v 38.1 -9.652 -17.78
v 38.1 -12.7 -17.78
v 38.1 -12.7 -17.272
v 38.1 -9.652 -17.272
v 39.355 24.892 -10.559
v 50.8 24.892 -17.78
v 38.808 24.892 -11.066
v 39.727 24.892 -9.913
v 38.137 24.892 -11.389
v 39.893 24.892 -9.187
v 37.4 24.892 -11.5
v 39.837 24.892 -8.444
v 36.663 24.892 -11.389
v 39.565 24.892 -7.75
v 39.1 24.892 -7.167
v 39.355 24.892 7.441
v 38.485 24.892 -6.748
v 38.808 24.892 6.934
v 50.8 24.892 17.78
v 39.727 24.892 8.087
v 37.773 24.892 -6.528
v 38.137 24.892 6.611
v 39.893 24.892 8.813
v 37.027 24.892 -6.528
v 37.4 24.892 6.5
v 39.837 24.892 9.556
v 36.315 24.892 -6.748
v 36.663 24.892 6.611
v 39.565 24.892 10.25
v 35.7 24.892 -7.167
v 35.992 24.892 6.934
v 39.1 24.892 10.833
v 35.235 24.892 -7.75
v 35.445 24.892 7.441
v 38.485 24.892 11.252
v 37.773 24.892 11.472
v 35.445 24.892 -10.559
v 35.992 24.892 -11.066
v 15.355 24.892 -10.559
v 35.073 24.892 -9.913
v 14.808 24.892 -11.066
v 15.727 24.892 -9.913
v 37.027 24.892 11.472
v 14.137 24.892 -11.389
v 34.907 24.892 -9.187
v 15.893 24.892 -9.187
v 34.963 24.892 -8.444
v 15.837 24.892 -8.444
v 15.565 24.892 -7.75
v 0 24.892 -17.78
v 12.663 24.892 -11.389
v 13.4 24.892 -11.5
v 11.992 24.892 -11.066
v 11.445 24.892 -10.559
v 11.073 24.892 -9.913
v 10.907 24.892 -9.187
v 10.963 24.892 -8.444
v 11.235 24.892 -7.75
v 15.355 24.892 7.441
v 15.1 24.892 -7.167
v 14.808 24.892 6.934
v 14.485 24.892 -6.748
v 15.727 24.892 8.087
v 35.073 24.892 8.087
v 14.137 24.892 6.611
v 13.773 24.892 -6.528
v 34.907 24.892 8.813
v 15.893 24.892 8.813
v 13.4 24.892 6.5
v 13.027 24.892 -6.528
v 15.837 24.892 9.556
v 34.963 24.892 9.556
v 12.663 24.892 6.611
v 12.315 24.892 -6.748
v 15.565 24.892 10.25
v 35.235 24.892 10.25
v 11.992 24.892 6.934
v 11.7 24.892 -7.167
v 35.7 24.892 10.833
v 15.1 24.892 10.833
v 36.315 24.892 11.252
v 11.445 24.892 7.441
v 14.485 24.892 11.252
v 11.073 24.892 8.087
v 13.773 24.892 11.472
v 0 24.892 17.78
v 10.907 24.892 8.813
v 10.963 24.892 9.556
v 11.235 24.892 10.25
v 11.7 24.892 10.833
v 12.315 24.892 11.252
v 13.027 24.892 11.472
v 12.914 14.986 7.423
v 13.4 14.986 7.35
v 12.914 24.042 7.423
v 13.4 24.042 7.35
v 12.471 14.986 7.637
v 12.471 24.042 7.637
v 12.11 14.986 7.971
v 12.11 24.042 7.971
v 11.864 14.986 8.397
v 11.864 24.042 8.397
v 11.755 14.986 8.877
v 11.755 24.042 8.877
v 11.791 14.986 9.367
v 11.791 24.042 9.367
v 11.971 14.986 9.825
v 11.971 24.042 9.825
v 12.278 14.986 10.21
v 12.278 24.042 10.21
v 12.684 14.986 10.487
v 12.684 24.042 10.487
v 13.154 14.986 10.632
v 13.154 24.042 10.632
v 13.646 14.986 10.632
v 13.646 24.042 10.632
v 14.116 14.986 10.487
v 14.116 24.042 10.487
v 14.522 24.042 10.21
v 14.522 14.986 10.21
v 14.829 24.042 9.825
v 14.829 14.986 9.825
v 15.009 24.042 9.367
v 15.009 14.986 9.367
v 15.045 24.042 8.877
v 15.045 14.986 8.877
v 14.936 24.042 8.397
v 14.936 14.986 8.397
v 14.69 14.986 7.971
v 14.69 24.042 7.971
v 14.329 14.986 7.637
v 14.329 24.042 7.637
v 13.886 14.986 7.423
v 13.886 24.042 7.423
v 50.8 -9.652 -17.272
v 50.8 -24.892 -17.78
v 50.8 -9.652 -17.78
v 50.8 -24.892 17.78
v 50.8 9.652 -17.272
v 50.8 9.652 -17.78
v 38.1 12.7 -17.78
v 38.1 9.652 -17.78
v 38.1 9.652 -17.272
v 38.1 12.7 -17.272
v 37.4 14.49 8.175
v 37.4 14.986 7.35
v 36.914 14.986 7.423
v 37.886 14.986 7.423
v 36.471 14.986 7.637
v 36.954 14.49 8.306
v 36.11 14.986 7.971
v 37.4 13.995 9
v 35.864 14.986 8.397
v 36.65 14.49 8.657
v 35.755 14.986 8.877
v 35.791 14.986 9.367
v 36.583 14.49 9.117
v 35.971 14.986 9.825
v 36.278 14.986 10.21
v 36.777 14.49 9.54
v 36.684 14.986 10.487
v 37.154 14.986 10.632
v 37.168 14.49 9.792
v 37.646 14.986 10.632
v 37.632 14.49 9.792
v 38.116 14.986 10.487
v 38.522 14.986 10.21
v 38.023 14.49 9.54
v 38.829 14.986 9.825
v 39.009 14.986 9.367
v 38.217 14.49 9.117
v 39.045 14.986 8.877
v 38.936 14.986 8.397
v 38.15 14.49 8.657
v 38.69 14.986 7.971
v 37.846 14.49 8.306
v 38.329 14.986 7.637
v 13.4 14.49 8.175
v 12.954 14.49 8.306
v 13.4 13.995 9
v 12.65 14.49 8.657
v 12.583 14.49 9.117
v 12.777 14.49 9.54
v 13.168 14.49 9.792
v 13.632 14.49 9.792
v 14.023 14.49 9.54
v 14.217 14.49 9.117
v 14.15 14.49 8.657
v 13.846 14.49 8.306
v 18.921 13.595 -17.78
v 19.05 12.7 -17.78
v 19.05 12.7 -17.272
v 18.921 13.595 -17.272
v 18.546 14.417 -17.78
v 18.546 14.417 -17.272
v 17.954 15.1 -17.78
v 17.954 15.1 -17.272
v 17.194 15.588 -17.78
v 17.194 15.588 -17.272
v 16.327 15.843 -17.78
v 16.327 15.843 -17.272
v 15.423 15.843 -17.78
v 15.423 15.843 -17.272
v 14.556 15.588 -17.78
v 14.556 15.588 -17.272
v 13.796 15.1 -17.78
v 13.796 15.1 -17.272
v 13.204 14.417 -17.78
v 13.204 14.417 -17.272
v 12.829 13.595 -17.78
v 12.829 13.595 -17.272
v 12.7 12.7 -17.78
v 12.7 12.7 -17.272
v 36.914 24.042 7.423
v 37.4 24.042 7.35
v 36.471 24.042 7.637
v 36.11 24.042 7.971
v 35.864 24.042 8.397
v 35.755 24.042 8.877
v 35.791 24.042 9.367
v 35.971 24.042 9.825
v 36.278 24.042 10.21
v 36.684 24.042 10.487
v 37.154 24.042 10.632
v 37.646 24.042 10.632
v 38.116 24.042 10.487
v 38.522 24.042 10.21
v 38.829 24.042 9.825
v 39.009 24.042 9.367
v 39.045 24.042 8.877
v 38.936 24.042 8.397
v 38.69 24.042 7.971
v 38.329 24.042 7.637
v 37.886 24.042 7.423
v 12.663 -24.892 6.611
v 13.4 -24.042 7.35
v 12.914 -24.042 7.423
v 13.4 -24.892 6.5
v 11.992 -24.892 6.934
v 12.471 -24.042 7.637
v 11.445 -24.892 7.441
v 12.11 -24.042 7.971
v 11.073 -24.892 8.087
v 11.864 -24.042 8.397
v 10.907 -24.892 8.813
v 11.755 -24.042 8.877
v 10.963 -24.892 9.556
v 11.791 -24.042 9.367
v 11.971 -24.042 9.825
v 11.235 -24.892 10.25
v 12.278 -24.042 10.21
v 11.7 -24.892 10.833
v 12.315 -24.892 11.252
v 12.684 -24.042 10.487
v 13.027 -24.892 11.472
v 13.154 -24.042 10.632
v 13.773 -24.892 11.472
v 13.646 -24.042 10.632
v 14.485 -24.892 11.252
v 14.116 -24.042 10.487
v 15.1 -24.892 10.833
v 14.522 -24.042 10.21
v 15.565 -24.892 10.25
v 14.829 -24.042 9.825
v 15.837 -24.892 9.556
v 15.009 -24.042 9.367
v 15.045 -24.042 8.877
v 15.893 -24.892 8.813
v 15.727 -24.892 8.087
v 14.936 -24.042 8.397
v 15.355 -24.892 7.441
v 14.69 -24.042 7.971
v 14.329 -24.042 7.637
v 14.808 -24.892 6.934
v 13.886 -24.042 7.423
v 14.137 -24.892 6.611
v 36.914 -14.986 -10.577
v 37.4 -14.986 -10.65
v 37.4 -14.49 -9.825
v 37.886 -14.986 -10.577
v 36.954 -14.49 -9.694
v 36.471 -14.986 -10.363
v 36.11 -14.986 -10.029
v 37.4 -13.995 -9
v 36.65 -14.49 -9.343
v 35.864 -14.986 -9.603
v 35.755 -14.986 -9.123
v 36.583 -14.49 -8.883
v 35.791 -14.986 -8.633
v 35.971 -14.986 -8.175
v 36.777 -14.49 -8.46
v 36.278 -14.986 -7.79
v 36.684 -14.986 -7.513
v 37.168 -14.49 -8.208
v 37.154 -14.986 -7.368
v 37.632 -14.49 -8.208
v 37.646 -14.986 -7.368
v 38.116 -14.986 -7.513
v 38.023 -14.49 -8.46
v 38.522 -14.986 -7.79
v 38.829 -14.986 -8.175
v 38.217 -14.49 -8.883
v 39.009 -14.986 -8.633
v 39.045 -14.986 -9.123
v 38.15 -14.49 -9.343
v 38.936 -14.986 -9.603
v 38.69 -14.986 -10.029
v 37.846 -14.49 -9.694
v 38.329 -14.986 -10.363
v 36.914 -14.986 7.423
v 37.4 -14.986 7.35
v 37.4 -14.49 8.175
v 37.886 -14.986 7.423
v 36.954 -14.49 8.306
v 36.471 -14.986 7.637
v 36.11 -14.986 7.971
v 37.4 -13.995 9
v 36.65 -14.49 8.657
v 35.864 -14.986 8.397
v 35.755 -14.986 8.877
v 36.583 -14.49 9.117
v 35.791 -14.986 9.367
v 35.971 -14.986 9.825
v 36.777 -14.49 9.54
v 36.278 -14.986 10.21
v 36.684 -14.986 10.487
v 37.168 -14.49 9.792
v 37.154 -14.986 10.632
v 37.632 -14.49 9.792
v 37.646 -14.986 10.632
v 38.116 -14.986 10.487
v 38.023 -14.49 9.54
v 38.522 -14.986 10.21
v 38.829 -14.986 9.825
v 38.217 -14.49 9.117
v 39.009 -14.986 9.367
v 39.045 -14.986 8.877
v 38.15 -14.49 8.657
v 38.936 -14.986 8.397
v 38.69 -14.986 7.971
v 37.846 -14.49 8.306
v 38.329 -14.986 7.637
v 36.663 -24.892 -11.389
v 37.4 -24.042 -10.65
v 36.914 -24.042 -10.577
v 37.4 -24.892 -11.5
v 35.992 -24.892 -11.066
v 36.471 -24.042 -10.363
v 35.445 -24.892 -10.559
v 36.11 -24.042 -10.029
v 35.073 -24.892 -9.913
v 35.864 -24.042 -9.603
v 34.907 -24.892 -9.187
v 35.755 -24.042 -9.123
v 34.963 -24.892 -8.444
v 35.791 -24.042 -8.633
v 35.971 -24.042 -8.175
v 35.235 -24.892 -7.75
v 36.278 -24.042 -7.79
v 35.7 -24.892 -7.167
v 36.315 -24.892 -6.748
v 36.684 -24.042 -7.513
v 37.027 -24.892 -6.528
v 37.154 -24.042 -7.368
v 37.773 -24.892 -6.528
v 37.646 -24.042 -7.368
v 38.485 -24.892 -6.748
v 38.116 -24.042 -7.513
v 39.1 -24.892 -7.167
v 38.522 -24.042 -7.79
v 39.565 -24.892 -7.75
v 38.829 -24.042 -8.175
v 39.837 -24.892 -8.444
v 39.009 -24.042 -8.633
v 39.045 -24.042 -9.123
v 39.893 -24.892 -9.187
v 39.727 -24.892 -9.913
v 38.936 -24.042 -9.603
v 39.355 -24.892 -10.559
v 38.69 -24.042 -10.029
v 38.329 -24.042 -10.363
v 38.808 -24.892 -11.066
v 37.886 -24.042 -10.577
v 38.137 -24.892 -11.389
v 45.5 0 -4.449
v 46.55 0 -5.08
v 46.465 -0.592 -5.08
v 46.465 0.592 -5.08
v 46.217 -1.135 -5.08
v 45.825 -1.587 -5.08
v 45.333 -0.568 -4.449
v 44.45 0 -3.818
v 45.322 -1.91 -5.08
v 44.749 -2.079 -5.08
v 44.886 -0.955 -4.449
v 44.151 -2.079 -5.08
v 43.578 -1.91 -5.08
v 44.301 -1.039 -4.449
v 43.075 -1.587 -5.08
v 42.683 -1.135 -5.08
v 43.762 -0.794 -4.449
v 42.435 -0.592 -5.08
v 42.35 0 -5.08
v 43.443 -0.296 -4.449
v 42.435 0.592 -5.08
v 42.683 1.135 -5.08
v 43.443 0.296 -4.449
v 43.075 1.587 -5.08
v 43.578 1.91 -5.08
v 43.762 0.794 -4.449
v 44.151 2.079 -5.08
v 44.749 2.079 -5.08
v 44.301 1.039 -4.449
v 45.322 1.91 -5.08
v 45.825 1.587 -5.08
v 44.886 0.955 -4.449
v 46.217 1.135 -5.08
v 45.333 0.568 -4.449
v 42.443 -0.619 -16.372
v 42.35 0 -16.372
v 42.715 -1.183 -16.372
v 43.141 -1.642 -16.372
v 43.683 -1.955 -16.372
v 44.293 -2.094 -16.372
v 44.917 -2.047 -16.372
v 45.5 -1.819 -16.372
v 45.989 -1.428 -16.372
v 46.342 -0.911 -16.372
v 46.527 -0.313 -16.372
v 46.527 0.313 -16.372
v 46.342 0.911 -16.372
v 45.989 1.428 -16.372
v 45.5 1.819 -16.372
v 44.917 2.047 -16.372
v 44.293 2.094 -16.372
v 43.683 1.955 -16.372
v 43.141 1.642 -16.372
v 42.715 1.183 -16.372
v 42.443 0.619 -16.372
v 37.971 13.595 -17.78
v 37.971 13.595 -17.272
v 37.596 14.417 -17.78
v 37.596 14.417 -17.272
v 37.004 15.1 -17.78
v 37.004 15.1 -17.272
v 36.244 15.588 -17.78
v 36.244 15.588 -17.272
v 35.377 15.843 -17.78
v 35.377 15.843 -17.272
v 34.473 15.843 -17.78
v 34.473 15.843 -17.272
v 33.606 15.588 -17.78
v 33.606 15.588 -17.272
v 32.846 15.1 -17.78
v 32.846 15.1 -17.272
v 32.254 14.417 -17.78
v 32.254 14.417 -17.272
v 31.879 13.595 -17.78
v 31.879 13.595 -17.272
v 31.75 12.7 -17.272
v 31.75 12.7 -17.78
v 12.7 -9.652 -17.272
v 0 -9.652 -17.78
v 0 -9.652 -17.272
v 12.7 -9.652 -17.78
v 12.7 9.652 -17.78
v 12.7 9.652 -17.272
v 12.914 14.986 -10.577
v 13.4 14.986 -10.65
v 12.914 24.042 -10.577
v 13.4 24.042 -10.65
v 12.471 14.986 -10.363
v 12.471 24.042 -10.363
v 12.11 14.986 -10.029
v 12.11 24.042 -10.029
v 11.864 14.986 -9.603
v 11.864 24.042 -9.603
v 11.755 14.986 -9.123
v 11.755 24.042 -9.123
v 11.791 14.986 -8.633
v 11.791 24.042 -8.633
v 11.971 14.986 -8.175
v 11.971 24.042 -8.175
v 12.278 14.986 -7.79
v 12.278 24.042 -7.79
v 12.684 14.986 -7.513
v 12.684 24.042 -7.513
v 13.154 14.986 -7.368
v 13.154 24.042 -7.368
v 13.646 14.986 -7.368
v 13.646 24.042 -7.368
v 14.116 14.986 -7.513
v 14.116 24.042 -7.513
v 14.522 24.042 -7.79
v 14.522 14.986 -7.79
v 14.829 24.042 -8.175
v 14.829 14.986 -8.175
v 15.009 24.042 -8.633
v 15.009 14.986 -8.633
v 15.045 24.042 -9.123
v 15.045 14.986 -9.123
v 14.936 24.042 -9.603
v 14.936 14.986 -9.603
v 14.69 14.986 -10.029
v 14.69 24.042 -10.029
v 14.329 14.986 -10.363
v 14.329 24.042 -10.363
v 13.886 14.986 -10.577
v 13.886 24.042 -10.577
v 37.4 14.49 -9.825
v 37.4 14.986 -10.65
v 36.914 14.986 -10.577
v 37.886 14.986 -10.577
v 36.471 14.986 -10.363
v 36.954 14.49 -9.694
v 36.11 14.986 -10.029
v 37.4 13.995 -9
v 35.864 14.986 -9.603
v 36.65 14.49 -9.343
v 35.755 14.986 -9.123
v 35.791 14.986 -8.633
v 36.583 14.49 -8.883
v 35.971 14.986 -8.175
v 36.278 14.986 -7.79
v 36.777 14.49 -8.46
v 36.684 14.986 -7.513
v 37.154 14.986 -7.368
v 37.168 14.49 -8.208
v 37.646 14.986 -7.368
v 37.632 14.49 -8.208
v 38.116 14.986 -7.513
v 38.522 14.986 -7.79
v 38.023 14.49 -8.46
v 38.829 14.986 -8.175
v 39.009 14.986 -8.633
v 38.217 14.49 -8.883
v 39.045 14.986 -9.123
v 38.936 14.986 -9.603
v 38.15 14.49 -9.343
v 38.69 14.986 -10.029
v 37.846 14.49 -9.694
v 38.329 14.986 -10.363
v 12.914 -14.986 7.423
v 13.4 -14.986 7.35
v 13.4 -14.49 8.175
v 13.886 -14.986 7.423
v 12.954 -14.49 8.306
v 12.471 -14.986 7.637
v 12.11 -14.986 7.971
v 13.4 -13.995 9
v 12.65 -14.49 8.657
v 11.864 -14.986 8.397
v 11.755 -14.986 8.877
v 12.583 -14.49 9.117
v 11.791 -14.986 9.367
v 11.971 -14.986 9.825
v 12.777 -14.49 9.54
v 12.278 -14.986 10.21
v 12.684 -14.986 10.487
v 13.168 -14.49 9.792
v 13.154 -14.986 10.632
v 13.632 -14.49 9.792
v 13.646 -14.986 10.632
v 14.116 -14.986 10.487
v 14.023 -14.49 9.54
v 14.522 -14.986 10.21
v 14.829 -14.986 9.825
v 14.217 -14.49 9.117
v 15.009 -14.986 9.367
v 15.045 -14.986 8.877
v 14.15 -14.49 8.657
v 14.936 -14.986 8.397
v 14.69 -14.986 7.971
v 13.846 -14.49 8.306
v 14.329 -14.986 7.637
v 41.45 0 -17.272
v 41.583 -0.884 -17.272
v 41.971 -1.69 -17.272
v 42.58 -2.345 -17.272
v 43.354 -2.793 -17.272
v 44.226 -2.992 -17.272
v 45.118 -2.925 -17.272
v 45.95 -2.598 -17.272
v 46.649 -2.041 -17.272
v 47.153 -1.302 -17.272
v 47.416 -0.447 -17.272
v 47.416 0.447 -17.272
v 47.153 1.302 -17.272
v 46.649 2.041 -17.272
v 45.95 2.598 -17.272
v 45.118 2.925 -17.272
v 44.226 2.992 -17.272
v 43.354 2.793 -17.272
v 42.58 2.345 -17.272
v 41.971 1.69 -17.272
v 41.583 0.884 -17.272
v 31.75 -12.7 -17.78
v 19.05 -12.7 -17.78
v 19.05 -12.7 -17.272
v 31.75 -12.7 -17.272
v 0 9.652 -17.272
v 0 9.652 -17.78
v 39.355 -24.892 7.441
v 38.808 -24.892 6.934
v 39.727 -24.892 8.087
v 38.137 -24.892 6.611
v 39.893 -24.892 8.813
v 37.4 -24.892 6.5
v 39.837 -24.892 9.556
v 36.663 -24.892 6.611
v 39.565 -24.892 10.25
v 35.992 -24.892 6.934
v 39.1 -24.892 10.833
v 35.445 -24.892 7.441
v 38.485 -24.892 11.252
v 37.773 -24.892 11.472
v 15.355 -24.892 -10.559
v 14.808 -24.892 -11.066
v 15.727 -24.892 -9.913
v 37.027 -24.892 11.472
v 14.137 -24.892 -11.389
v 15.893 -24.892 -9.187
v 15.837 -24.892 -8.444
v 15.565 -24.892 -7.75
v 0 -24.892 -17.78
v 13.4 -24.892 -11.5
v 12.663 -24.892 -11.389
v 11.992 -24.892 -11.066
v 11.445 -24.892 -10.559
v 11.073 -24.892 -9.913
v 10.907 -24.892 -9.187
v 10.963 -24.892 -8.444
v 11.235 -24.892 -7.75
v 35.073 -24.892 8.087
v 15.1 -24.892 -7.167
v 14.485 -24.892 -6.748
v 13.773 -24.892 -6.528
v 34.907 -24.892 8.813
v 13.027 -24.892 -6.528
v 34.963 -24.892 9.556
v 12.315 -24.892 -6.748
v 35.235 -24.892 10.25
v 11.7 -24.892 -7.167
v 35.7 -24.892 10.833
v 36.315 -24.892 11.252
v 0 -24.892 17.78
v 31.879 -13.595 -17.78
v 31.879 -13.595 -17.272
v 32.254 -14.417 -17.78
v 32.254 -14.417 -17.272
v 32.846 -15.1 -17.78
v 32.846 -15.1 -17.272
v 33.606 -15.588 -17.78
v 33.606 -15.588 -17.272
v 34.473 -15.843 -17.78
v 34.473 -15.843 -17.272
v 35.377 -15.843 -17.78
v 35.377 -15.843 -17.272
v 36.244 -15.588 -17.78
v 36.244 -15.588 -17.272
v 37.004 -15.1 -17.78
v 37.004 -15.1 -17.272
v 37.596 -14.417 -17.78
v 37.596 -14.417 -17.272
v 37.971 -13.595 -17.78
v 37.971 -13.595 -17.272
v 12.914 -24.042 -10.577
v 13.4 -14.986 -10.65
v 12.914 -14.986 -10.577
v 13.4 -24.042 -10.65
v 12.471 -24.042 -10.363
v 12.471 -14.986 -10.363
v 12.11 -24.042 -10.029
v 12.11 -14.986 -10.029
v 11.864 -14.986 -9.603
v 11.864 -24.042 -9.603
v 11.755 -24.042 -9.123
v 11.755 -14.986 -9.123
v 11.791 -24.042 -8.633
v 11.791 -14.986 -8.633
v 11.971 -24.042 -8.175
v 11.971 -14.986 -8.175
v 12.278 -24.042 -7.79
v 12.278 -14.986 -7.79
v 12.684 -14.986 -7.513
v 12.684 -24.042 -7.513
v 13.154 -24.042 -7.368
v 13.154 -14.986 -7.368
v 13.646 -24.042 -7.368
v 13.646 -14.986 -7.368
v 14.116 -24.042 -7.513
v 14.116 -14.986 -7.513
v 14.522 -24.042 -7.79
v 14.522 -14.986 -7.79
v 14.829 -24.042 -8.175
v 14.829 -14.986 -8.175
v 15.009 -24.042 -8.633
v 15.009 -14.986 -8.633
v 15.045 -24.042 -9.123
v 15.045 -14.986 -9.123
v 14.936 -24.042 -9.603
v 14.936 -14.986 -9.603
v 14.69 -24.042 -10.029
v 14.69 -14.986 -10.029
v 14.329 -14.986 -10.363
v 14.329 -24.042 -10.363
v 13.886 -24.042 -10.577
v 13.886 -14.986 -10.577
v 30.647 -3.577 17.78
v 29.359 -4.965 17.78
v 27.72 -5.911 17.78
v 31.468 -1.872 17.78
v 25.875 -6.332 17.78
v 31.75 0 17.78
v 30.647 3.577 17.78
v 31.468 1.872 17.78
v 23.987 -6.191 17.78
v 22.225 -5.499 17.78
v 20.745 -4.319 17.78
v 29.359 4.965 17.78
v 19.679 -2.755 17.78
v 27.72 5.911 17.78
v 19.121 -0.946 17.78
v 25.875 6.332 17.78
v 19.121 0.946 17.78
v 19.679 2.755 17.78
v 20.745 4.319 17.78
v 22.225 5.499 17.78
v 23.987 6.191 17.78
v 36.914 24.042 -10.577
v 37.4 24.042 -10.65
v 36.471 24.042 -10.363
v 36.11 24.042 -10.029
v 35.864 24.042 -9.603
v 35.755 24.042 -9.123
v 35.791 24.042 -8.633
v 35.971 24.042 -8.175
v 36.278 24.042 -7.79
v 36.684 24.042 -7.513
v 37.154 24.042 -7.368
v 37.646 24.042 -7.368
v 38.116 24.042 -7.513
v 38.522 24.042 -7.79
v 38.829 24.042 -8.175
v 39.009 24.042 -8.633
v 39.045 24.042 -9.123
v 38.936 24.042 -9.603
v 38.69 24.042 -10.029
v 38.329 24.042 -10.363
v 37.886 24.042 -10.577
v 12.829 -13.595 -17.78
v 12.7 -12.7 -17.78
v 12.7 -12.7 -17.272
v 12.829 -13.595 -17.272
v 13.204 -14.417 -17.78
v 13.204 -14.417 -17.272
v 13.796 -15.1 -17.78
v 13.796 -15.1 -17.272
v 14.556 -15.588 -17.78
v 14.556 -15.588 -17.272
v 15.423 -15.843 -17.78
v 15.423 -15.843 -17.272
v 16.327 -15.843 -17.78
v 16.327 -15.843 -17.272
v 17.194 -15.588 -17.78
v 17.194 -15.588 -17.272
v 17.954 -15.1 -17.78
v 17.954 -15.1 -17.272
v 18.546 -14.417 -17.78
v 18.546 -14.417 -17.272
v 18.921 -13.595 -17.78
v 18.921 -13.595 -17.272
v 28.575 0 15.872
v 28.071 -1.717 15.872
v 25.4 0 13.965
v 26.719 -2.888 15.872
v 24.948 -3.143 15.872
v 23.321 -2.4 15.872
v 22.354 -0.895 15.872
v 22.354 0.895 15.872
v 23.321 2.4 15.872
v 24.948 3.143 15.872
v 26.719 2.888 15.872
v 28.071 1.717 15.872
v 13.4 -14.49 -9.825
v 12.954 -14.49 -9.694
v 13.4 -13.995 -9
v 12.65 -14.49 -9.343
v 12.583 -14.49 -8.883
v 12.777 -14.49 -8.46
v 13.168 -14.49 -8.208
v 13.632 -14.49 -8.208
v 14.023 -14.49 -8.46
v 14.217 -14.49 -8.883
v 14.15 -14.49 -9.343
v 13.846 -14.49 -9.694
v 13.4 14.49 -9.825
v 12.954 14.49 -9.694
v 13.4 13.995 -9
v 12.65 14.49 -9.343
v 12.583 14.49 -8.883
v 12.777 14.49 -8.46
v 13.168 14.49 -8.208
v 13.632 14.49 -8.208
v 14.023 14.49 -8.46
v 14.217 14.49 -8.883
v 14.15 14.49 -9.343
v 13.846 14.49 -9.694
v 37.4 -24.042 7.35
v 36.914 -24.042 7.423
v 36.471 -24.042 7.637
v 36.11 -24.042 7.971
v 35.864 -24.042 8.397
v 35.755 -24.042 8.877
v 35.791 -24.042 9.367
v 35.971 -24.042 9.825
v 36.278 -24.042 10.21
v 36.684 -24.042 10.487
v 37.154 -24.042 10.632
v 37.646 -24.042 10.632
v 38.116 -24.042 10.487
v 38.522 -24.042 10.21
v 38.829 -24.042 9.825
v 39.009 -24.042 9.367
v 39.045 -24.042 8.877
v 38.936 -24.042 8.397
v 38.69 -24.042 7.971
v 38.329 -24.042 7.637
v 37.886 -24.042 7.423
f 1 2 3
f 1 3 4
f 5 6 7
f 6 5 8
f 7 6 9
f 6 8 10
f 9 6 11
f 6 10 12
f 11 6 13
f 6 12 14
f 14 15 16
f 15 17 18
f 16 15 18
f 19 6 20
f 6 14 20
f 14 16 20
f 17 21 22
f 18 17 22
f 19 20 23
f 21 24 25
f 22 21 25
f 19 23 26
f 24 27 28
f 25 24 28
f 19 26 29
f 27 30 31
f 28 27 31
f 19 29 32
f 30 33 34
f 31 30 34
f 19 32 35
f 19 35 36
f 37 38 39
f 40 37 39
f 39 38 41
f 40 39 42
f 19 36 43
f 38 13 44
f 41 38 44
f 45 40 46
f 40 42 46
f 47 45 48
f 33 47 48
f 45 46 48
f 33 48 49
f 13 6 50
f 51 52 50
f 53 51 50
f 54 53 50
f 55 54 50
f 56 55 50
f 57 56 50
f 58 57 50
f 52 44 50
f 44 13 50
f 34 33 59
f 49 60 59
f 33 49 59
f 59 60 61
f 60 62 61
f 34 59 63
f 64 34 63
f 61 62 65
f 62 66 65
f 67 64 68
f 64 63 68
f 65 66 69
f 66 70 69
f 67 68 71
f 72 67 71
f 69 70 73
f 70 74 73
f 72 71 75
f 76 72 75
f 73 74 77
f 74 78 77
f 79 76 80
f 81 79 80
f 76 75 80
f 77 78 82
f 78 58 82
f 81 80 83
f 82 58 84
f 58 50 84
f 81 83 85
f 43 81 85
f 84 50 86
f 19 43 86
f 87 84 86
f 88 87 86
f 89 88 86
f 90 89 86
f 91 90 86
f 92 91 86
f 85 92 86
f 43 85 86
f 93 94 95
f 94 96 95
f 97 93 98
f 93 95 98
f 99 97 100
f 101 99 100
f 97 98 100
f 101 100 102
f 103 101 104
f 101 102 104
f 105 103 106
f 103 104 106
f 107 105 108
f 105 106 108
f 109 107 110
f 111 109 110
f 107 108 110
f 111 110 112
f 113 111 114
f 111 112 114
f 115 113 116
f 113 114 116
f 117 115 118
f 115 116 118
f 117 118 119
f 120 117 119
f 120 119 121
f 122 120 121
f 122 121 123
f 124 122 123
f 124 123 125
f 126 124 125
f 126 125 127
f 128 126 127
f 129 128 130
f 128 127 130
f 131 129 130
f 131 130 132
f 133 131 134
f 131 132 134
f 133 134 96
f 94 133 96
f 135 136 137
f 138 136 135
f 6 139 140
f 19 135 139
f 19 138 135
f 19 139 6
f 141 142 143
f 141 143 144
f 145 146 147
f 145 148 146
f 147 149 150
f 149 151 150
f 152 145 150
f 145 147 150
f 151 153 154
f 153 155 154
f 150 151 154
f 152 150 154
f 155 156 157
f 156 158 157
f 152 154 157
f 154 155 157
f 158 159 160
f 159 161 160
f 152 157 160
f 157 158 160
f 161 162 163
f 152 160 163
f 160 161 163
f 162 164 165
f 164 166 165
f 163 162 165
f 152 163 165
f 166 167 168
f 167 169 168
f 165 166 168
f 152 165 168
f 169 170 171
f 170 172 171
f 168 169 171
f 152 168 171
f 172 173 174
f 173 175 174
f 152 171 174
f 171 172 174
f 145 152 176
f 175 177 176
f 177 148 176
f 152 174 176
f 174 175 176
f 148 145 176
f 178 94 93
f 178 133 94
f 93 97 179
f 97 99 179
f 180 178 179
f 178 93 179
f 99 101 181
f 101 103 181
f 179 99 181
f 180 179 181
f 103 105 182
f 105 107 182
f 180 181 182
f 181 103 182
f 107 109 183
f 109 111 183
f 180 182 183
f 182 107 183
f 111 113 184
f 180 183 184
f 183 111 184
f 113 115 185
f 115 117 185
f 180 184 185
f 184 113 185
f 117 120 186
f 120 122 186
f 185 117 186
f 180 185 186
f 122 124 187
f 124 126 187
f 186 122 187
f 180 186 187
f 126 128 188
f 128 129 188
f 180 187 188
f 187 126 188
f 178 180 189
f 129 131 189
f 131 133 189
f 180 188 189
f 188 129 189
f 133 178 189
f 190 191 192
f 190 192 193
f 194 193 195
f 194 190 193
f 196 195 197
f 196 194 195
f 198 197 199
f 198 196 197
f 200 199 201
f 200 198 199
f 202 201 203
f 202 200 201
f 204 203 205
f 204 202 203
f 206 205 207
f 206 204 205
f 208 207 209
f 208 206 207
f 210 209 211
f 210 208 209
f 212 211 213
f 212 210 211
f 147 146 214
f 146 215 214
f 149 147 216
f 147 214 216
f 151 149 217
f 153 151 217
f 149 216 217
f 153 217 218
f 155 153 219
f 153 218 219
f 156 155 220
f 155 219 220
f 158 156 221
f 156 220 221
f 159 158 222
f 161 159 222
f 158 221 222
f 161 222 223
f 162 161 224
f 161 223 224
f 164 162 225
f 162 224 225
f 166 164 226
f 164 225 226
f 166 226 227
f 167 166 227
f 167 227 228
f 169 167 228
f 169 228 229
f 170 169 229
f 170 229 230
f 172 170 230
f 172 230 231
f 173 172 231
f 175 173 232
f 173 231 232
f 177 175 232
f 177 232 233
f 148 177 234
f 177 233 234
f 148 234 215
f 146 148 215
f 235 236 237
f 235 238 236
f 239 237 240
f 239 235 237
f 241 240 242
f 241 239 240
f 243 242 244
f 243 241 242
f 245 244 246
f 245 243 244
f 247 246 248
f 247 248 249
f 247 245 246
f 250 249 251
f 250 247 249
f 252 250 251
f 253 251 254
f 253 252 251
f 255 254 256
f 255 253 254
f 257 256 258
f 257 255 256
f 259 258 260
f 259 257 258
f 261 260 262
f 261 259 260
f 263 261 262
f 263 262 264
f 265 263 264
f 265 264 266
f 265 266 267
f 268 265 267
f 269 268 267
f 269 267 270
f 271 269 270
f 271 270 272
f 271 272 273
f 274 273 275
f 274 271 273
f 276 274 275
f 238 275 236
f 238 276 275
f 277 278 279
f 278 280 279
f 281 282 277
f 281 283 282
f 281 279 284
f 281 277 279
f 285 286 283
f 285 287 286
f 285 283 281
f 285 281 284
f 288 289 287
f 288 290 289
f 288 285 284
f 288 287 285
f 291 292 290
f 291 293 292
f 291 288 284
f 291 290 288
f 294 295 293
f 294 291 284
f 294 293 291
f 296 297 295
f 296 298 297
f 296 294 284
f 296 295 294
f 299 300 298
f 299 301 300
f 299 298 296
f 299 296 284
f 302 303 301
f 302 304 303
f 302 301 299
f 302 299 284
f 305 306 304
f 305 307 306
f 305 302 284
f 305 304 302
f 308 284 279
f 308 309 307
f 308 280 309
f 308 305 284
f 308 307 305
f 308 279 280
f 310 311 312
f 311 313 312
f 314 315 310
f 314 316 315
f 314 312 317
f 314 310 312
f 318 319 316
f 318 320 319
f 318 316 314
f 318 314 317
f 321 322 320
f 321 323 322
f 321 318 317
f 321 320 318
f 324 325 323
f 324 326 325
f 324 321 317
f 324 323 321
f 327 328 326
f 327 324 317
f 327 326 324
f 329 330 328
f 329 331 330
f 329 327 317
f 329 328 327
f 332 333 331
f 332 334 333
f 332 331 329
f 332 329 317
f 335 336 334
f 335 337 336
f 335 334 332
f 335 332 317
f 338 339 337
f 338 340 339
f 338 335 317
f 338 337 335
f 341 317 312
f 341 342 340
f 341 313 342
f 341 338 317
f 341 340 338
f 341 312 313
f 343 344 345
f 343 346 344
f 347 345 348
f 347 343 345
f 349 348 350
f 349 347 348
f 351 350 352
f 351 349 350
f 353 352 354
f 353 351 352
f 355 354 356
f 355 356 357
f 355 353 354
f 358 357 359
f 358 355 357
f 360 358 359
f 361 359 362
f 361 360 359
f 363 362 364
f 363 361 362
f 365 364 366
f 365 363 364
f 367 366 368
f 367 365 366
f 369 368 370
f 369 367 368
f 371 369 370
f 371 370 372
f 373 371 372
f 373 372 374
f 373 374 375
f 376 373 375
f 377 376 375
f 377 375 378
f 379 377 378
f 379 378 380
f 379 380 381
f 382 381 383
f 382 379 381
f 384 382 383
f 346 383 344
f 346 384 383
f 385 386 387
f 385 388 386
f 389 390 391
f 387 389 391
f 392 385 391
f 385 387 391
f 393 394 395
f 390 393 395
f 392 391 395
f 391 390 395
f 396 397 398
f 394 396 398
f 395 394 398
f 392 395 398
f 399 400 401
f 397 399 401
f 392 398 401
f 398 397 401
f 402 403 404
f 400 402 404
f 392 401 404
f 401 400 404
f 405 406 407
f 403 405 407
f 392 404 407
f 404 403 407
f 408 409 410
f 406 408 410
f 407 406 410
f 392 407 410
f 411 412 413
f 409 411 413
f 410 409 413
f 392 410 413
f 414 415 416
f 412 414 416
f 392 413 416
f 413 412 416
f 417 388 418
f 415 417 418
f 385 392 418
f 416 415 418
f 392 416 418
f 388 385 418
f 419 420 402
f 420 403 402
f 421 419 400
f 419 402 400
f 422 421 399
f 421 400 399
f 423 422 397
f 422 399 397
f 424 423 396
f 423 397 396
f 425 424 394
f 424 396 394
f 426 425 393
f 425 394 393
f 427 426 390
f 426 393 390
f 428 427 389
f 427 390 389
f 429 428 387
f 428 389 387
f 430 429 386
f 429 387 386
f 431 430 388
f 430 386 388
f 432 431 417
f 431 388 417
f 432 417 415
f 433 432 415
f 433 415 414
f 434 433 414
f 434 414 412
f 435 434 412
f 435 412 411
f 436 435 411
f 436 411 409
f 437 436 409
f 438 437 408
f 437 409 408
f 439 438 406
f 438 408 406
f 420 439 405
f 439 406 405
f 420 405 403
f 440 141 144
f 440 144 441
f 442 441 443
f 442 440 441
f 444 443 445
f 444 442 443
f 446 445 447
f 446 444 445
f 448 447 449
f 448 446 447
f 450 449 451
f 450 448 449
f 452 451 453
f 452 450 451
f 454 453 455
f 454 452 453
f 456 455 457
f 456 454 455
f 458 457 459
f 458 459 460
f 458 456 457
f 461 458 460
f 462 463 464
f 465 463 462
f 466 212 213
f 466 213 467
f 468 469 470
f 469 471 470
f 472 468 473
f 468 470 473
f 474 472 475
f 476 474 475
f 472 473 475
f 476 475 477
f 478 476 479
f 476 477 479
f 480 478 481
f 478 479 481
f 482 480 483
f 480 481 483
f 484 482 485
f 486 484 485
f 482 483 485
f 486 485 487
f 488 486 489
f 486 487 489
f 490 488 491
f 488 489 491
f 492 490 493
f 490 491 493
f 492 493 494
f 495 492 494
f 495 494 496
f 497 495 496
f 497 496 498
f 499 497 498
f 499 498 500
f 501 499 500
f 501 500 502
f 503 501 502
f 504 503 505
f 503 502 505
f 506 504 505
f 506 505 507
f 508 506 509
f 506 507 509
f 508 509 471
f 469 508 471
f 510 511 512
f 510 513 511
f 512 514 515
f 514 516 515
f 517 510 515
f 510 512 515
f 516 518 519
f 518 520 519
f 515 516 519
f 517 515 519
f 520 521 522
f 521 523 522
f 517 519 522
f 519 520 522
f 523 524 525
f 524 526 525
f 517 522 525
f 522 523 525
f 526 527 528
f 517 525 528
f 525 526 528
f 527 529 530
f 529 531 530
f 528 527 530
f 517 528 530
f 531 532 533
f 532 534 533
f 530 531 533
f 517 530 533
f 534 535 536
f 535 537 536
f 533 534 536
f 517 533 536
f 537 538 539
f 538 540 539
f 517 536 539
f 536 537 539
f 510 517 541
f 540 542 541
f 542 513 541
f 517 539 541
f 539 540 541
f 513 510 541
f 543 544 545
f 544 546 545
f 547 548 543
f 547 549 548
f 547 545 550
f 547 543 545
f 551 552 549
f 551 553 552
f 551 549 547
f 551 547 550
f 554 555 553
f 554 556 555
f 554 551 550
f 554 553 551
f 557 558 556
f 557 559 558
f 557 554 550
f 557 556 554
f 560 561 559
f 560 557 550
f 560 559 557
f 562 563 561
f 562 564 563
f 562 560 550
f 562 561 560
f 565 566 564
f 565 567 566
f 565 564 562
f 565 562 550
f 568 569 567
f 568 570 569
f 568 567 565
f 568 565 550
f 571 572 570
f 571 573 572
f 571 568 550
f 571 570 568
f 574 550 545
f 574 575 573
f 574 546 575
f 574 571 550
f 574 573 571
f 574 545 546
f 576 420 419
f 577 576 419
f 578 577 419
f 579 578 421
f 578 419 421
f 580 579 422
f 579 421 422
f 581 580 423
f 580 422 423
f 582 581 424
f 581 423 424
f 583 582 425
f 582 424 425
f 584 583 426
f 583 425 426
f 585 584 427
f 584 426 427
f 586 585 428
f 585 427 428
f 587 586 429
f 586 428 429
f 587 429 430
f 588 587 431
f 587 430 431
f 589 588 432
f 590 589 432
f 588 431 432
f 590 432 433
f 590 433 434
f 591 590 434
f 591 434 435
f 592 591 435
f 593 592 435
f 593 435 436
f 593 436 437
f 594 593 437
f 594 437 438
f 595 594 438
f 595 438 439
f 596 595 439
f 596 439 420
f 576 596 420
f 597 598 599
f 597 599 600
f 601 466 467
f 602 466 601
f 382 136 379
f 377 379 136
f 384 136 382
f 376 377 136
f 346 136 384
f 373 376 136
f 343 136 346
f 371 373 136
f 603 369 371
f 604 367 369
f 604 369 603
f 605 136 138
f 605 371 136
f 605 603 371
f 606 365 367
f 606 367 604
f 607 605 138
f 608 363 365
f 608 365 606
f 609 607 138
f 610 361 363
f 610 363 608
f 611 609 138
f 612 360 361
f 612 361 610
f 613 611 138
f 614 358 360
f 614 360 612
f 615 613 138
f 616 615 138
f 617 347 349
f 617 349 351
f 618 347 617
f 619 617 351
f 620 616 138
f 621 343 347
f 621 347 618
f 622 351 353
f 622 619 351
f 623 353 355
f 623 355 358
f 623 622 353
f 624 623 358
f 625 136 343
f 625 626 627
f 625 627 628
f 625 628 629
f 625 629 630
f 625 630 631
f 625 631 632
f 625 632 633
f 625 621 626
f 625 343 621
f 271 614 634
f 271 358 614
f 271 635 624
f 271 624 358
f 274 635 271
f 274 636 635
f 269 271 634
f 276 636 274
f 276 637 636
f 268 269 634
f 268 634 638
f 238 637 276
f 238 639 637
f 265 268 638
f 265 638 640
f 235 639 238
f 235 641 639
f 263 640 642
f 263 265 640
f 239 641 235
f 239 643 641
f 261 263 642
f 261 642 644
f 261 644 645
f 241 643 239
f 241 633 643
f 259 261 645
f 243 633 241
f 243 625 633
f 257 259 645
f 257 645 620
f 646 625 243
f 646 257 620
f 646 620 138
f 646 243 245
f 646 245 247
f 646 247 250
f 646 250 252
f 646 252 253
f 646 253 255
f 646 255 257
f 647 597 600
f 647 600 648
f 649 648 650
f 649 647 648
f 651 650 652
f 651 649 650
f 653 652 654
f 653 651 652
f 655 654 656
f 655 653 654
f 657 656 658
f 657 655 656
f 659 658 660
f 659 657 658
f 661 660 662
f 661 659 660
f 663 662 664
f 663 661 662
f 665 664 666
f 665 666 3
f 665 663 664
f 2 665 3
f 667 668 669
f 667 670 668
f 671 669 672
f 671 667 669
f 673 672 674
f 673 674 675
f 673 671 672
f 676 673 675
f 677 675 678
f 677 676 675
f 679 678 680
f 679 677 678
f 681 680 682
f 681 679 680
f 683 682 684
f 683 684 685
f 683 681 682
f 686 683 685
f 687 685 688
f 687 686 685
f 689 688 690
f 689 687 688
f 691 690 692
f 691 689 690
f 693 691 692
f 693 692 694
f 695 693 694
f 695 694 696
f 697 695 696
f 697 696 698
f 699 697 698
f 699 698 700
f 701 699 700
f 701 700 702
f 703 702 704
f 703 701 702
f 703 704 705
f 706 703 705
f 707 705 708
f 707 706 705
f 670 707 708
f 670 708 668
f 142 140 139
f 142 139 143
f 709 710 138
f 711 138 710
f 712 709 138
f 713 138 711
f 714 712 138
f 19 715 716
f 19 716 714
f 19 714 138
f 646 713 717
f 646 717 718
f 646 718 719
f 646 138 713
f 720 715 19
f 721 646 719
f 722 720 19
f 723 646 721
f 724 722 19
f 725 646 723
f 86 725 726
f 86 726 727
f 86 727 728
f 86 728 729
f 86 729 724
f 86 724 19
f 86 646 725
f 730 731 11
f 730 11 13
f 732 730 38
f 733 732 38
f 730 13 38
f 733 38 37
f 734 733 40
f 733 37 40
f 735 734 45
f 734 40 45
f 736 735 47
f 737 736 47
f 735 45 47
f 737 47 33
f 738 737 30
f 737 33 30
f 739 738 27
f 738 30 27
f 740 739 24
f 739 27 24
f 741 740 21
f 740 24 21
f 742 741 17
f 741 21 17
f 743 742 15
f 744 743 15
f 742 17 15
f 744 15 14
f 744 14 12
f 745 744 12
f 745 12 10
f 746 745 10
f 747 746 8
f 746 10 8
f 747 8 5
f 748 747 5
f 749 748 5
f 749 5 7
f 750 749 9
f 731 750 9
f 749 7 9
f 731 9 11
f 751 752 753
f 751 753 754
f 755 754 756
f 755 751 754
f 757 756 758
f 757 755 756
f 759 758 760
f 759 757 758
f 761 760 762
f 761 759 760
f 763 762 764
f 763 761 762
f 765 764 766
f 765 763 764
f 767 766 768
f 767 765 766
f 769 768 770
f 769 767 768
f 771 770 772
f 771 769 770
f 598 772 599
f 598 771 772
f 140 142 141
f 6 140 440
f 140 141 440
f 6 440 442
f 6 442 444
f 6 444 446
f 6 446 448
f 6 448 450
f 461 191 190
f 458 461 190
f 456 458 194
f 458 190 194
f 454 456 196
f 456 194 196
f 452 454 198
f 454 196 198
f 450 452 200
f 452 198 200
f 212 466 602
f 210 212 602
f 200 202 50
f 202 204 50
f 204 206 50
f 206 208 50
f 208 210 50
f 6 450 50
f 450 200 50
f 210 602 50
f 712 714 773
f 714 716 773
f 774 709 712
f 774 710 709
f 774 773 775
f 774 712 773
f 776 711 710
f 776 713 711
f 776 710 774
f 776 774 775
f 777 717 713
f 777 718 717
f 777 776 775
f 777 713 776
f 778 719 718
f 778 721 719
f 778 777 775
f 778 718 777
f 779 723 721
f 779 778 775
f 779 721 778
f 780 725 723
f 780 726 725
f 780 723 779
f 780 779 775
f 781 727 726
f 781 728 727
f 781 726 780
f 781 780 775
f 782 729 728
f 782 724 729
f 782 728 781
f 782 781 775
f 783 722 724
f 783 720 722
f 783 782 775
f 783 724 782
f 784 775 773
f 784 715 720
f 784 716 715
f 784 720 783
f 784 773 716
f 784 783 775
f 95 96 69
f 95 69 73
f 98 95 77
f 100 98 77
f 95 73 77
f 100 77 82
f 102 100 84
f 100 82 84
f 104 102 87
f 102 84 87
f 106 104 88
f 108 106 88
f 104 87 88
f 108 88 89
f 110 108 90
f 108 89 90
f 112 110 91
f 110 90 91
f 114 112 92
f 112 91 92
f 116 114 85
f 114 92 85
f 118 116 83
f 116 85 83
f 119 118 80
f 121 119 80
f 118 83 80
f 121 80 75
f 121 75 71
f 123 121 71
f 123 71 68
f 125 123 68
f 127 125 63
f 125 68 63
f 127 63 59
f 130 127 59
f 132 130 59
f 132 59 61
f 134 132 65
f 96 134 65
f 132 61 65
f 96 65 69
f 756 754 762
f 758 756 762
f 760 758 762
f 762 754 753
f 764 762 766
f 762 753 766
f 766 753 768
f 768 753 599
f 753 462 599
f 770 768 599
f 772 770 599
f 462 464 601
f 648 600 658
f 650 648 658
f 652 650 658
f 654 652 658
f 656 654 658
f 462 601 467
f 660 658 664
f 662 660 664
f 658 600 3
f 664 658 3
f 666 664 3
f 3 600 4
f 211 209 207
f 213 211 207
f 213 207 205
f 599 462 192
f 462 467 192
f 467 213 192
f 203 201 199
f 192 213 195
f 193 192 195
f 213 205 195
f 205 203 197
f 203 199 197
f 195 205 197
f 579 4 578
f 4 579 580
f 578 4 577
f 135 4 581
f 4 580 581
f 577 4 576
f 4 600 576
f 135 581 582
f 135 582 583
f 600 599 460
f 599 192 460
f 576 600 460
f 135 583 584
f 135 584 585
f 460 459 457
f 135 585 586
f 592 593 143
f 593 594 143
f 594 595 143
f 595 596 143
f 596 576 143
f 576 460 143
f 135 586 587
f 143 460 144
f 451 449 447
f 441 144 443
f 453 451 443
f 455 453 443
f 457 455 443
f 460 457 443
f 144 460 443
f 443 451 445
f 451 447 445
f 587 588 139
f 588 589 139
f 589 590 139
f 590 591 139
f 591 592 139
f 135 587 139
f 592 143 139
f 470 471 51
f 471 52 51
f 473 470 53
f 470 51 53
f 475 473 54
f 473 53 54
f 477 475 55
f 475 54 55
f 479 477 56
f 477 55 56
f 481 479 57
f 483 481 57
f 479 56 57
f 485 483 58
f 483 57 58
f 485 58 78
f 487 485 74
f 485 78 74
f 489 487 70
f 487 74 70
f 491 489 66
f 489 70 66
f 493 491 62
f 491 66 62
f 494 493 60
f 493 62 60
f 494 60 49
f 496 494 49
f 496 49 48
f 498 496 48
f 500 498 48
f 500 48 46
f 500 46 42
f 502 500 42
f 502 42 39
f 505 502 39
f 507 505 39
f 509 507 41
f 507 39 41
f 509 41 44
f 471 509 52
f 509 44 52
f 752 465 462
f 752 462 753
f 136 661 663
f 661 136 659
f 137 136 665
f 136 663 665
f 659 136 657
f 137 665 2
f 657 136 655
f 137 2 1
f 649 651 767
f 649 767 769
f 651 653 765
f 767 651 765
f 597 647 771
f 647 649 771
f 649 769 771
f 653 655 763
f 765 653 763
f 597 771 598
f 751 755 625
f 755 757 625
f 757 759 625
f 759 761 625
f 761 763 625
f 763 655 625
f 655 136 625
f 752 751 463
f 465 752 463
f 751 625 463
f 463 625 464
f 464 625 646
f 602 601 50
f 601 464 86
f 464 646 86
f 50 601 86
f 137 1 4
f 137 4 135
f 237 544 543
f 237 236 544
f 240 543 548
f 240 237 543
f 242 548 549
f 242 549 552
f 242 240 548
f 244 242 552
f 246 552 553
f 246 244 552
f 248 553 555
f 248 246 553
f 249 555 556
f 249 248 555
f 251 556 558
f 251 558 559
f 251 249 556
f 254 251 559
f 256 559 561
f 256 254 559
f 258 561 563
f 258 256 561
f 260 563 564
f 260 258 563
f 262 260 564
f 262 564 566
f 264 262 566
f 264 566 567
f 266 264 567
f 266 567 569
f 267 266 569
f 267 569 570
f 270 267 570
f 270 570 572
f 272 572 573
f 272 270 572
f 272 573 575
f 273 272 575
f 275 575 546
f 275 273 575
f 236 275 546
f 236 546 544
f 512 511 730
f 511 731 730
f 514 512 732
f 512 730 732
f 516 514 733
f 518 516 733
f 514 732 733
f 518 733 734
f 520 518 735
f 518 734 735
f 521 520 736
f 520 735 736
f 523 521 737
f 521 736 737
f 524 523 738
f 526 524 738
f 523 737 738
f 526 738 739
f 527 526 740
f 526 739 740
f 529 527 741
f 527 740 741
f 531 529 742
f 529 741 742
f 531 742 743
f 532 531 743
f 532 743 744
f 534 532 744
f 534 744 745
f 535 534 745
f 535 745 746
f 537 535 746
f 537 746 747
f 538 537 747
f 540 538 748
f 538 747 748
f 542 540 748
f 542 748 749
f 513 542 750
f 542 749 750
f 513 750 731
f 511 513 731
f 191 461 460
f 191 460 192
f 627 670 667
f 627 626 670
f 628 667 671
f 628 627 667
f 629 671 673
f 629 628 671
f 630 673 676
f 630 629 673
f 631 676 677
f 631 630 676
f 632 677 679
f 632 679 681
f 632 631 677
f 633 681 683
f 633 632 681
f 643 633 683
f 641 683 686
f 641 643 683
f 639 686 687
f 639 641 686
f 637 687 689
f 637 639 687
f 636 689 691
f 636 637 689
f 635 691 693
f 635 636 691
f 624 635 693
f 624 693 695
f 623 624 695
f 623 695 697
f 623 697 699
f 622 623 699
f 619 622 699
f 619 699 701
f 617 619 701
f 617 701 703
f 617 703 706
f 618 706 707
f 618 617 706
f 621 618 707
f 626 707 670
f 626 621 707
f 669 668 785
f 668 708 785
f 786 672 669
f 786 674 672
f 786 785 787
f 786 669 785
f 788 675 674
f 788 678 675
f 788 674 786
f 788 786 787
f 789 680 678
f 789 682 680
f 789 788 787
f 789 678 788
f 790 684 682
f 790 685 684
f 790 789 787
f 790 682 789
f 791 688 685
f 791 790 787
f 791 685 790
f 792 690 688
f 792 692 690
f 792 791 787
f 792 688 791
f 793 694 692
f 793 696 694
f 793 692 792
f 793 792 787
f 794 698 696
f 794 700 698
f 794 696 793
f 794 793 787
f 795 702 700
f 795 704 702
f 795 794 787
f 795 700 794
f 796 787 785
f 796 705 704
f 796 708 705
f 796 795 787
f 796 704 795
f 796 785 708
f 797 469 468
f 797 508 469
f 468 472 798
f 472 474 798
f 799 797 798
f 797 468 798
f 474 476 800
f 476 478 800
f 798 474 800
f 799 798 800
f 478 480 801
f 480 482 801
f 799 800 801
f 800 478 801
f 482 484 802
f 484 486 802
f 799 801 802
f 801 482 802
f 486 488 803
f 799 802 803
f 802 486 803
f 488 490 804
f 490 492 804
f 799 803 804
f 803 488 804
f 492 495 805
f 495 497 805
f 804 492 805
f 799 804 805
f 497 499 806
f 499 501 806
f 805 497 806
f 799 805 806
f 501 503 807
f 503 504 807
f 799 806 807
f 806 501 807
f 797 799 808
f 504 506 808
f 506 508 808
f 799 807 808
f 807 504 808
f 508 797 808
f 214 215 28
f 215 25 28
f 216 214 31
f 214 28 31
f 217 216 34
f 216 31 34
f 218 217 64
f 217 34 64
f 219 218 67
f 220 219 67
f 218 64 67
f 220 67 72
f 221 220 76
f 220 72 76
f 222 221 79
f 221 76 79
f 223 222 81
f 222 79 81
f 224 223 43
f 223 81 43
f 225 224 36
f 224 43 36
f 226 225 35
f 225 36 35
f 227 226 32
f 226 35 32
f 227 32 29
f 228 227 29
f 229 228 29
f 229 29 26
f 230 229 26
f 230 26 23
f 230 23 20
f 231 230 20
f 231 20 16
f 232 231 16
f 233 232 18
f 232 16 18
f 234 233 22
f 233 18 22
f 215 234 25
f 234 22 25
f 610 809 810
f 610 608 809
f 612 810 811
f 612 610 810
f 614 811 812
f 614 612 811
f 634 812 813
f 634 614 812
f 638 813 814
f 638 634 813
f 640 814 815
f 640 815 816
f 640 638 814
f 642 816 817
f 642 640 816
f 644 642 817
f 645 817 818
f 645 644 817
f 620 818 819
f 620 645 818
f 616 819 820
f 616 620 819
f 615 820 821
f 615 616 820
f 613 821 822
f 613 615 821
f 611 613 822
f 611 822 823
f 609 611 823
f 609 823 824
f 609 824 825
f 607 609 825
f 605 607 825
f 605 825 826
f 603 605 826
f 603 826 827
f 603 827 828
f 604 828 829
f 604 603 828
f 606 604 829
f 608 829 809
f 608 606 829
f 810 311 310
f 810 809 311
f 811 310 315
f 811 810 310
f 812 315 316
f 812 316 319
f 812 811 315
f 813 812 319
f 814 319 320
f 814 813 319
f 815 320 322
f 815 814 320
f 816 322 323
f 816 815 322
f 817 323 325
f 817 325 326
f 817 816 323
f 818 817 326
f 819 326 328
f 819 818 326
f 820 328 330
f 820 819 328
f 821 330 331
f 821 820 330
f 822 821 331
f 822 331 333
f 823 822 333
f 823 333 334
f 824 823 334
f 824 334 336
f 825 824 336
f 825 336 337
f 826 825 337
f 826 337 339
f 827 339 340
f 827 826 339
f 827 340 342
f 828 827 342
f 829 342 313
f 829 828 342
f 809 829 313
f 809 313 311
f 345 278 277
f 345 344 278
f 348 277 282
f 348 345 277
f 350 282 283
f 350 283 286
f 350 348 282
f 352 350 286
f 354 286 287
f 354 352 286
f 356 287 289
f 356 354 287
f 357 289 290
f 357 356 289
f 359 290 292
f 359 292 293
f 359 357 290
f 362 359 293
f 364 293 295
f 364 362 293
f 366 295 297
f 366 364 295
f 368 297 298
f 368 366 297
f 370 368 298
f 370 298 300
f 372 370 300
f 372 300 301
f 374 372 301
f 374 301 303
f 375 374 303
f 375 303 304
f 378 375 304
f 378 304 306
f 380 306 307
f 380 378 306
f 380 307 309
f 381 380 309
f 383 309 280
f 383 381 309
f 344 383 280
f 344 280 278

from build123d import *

# Parameters (mm, degrees)
SKETCH1_W                       = 49.784
SKETCH1_H                       = 35.56
BOSS_EXTRUDE1_DEPTH             = 50.8
M4X0_7_TAPPED_HOLE1_AT_2_COUNT  = 2
M4X0_7_TAPPED_HOLE1_AT_2_PITCH  = 30
M4X0_7_TAPPED_HOLE1_AT_3_COUNT  = 2
M4X0_7_TAPPED_HOLE1_AT_3_PITCH  = 18
M4X0_7_TAPPED_HOLE1_AT_4_COUNT  = 2
M4X0_7_TAPPED_HOLE1_AT_4_PITCH  = 24
CUT_EXTRUDE2_DEPTH              = 0.508
MIRROR2_START                   = -17.78
MIRROR2_DEPTH                   = 0.508
M5X0_8_TAPPED_HOLE1_D           = 4.2
M5X0_8_TAPPED_HOLE1_DEPTH       = 12.192
M5X0_8_TAPPED_HOLE1_CSINK_D     = 6
M5X0_8_TAPPED_HOLE1_CSINK_ANGLE = 90
M5X0_8_TAPPED_HOLE1_TIP         = 1.2618073


# Read off the part's stored shape, not the designer's step: Mirror2
with BuildPart() as part:
    # Sketch1 → Boss-Extrude1 (new body)
    with BuildSketch(Plane.YZ):
        Rectangle(SKETCH1_W, SKETCH1_H)
    extrude(amount=BOSS_EXTRUDE1_DEPTH)

    # Sketch3 → M4x0.7 Tapped Hole1 (revolve, cut)
    with BuildSketch(Plane(origin=(13.4, -24.892, -9), x_dir=(0, 0, -1), z_dir=(1, 0, 0))):
        Polygon((0, 0), (0, 10.897420021), (1.65, 9.906), (1.65, 0.85), (2.5, 0), align=None)
    m4x0_7_tapped_hole1 = revolve(axis=Axis((13.4, -31.242, -9), (0, 1, 0)), mode=Mode.SUBTRACT)

    # M4x0.7 Tapped Hole1 at 2: M4x0.7 Tapped Hole1 ×2
    with Locations(*[Vector(0.8000000000000002, 0, 0.5999999999999998) * (i * M4X0_7_TAPPED_HOLE1_AT_2_PITCH) for i in range(1, M4X0_7_TAPPED_HOLE1_AT_2_COUNT)]):
        add(m4x0_7_tapped_hole1, mode=Mode.SUBTRACT)

    # M4x0.7 Tapped Hole1 at 3: M4x0.7 Tapped Hole1 ×2
    with Locations(*[(0, 0, i * M4X0_7_TAPPED_HOLE1_AT_3_PITCH) for i in range(1, M4X0_7_TAPPED_HOLE1_AT_3_COUNT)]):
        add(m4x0_7_tapped_hole1, mode=Mode.SUBTRACT)

    # M4x0.7 Tapped Hole1 at 4: M4x0.7 Tapped Hole1 ×2
    with Locations(*[(i * M4X0_7_TAPPED_HOLE1_AT_4_PITCH, 0, 0) for i in range(1, M4X0_7_TAPPED_HOLE1_AT_4_COUNT)]):
        add(m4x0_7_tapped_hole1, mode=Mode.SUBTRACT)

    # Mirror1: M4x0.7 Tapped Hole1 across plane
    add(m4x0_7_tapped_hole1.mirror(Plane.ZX), mode=Mode.SUBTRACT)

    # Mirror1 copy 1 sketch → Mirror1 copy 1 (revolve, cut)
    with BuildSketch(Plane(origin=(37.4, 24.892, 9), x_dir=(0, 0, -1), z_dir=(1, 0, 0))):
        Polygon((0, 0), (0, -10.897420021), (1.65, -9.906), (1.65, -0.85), (2.5, 0), align=None)
    revolve(axis=Axis((37.4, 31.242, 9), (0, 1, 0)), mode=Mode.SUBTRACT)

    # Mirror1 copy 2 sketch → Mirror1 copy 2 (revolve, cut)
    with BuildSketch(Plane(origin=(13.4, 24.892, 9), x_dir=(0, 0, -1), z_dir=(1, 0, 0))):
        Polygon((0, 0), (0, -10.897420021), (1.65, -9.906), (1.65, -0.85), (2.5, 0), align=None)
    revolve(axis=Axis((13.4, 31.242, 9), (0, 1, 0)), mode=Mode.SUBTRACT)

    # Mirror1 copy 3 sketch → Mirror1 copy 3 (revolve, cut)
    with BuildSketch(Plane(origin=(37.4, 24.892, -9), x_dir=(0, 0, -1), z_dir=(1, 0, 0))):
        Polygon((0, 0), (0, -10.897420021), (1.65, -9.906), (1.65, -0.85), (2.5, 0), align=None)
    revolve(axis=Axis((37.4, 31.242, -9), (0, 1, 0)), mode=Mode.SUBTRACT)

    # Sketch5 → Cut-Revolve1 (revolve, cut)
    with BuildSketch(Plane(origin=(0, 0, 0), x_dir=(-1, 0, 0), z_dir=(0, 1, 0))):
        Polygon((-25.4, 17.78), (-25.4, 13.964535069), (-31.75, 17.78), align=None)
    revolve(axis=Axis((25.4, 0, 17.78), (0, 0, -1)), mode=Mode.SUBTRACT)

    # Sketch9 → Cut-Extrude2 (cut)
    with BuildSketch(Plane(origin=(0, 0, -17.78), x_dir=(1, 0, 0), z_dir=(0, 0, -1))):
        with BuildLine():
            Line((25.4, 12.7), (31.75, 12.7))
            ThreePointArc((31.75, 12.7), (34.925, 15.875), (38.1, 12.7))
            Line((38.1, 12.7), (38.1, 9.652))
            Line((38.1, 9.652), (50.8, 9.652))
            Line((50.8, 9.652), (50.8, 0))
            Line((50.8, 0), (25.4, 0))
            Line((25.4, 0), (25.4, 12.7))
        make_face()
    extrude(amount=-CUT_EXTRUDE2_DEPTH, mode=Mode.SUBTRACT)

    # Mirror2 outline → Mirror2 (cut)
    with BuildSketch(Plane.XY.offset(MIRROR2_START)):
        with BuildLine():
            Line((38.1, 9.652), (38.1, 12.7))
            ThreePointArc((38.1, 12.7), (34.925, 15.875), (31.75, 12.7))
            Line((31.75, 12.7), (19.05, 12.7))
            ThreePointArc((19.05, 12.7), (15.875, 15.875), (12.7, 12.7))
            Line((12.7, 12.7), (12.7, 9.652))
            Line((12.7, 9.652), (0, 9.652))
            Line((0, 9.652), (0, -9.652))
            Line((0, -9.652), (12.7, -9.652))
            Line((12.7, -9.652), (12.7, -12.7))
            ThreePointArc((12.7, -12.7), (15.875, -15.875), (19.05, -12.7))
            Line((19.05, -12.7), (25.4, -12.7))
            Line((25.4, -12.7), (25.4, 0))
            Line((25.4, 0), (50.8, 0))
            Line((50.8, 0), (50.8, 9.652))
            Line((50.8, 9.652), (38.1, 9.652))
        make_face()
    extrude(amount=MIRROR2_DEPTH, mode=Mode.SUBTRACT)

    # M5x0.8 Tapped Hole1
    with Locations(Plane(origin=(0, 0, -17.272), x_dir=(1, 0, 0), z_dir=(0, 0, -1))):
        with Locations((44.45, 0)):
            CounterSinkHole(M5X0_8_TAPPED_HOLE1_D / 2, M5X0_8_TAPPED_HOLE1_CSINK_D / 2, depth=M5X0_8_TAPPED_HOLE1_DEPTH, counter_sink_angle=M5X0_8_TAPPED_HOLE1_CSINK_ANGLE)
            with Locations((0, 0, -(M5X0_8_TAPPED_HOLE1_DEPTH + M5X0_8_TAPPED_HOLE1_TIP / 2))):  # 118° drill point
                Cone(0, M5X0_8_TAPPED_HOLE1_D / 2, M5X0_8_TAPPED_HOLE1_TIP, mode=Mode.SUBTRACT)


solid = part.part
